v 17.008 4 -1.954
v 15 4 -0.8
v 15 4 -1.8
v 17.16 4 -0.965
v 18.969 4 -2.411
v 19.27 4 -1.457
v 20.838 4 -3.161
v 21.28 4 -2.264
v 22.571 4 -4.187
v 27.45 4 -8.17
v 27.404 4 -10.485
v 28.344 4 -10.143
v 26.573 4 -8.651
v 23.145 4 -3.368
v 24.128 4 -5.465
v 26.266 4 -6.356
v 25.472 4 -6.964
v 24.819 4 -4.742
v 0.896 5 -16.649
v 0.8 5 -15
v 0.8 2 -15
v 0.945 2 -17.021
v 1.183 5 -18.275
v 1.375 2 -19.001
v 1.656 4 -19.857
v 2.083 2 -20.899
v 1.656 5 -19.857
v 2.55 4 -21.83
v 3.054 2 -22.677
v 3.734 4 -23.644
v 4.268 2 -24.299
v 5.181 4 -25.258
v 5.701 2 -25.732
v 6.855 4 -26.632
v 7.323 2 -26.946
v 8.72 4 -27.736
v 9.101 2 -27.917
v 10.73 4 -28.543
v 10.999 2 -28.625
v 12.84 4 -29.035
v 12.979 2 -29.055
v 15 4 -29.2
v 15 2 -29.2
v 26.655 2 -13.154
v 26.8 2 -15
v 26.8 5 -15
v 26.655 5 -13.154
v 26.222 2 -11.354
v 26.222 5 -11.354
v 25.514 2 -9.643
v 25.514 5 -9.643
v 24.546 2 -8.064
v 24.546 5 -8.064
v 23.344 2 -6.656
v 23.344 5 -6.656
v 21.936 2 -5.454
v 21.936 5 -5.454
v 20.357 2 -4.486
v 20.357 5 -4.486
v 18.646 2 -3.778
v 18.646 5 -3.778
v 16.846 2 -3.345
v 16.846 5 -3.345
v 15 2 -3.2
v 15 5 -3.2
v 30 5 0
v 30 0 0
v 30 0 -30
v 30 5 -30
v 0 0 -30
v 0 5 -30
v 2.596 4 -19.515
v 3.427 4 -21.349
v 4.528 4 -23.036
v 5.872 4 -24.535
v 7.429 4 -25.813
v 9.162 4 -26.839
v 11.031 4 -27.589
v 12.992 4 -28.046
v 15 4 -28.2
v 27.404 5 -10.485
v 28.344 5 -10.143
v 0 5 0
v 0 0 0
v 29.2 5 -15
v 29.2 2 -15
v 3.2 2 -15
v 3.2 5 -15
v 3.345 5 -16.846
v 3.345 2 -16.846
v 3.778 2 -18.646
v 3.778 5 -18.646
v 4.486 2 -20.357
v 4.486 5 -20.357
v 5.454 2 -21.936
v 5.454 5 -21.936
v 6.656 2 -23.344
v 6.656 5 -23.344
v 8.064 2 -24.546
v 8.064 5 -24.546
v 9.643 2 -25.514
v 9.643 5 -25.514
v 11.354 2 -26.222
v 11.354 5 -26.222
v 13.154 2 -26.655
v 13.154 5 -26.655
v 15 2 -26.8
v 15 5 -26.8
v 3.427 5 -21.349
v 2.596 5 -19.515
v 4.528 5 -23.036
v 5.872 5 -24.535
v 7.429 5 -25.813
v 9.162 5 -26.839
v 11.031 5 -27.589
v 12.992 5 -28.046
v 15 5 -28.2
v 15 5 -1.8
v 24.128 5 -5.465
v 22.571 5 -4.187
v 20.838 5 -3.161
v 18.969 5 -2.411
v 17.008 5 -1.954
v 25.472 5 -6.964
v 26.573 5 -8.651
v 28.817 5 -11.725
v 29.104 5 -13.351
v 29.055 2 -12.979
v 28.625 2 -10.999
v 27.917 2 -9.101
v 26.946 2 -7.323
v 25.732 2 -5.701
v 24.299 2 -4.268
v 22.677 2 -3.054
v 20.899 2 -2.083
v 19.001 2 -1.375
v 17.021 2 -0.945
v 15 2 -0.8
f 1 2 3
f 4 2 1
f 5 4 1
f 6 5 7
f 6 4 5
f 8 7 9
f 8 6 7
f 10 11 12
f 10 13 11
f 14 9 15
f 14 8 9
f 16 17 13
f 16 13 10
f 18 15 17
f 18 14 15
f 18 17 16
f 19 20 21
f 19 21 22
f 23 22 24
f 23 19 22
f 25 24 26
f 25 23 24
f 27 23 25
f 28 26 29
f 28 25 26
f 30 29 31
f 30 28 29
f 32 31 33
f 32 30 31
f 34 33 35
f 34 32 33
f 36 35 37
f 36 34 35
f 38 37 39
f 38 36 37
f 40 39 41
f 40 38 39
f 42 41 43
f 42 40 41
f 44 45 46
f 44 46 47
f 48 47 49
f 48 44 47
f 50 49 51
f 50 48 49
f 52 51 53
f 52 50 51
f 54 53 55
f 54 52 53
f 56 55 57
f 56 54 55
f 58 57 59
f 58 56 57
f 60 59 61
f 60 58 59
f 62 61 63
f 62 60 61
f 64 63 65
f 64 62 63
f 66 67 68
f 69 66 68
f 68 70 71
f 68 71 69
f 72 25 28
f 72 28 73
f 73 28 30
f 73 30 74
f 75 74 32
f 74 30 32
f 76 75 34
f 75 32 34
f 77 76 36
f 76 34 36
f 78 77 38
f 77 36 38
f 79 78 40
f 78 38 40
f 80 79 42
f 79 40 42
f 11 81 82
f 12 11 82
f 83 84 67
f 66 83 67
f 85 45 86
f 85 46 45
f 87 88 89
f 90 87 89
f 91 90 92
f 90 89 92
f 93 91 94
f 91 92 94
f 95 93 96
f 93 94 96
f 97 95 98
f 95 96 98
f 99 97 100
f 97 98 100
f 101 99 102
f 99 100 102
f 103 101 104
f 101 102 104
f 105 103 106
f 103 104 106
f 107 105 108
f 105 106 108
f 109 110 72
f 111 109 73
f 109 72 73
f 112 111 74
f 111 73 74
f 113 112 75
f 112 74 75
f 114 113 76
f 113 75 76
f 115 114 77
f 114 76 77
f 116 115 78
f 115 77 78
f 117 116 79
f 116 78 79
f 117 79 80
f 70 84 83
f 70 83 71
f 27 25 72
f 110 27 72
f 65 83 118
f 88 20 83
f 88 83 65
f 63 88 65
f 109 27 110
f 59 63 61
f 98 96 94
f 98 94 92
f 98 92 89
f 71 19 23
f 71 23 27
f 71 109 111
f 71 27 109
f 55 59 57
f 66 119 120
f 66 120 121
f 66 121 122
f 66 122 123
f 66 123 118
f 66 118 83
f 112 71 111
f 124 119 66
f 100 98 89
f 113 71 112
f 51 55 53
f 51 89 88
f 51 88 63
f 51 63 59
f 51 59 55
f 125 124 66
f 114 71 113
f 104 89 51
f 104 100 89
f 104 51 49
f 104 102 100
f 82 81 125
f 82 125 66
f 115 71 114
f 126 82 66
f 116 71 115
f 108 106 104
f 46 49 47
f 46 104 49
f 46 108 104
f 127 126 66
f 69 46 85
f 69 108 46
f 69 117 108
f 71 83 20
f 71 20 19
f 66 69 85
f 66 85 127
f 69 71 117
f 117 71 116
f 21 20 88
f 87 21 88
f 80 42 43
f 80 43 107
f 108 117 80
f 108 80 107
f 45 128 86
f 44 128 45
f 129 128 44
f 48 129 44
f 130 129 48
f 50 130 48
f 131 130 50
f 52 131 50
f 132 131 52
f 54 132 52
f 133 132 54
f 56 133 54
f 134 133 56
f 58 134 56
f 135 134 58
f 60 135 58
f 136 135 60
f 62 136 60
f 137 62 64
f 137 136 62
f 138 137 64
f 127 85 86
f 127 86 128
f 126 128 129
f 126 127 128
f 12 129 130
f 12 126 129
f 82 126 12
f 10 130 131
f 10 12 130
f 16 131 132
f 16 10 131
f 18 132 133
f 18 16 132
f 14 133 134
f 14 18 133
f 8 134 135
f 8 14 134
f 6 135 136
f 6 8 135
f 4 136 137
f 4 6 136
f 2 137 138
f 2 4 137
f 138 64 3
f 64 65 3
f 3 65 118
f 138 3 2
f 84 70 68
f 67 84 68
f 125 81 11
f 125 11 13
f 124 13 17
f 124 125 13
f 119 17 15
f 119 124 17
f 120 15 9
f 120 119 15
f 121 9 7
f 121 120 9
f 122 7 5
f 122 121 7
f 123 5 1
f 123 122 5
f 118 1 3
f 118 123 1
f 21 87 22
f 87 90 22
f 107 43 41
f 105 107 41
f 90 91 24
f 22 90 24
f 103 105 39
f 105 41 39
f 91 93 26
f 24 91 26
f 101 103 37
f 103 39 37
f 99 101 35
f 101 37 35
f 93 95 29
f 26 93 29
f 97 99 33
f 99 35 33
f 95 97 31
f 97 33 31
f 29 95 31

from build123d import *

# Parameters (mm, degrees)
SKETCH1_W           = 30
SKETCH1_H           = 30
BOSS_EXTRUDE1_DEPTH = 5
CUT_REVOLVE2_ANGLE  = 90
SKETCH2_5_W         = 2.4
SKETCH2_5_H         = 3
SKETCH2_5_W_2       = 1
SKETCH2_5_H_2       = 1
CUT_REVOLVE3_ANGLE  = 20


with BuildPart() as part:
    # Sketch1 → Boss-Extrude1 (new body)
    with BuildSketch(Plane(origin=(0, 0, 0), x_dir=(1, 0, 0), z_dir=(0, 1, 0))):
        with Locations((15, 15)):
            Rectangle(SKETCH1_W, SKETCH1_H)
    extrude(amount=BOSS_EXTRUDE1_DEPTH)

    # Sketch2 → Cut-Revolve2 (revolve, cut)
    with BuildSketch(Plane.XY.offset(-15)):
        Polygon((1.8, 4), (0.8, 4), (0.8, 2), (3.2, 2), (3.2, 5), (1.8, 5), align=None)
        Polygon((26.8, 2), (29.2, 2), (29.2, 4), (28.2, 4), (28.2, 5), (26.8, 5), align=None)
    revolve(axis=Axis((15, 5, -15), (0, -1, 0)), revolution_arc=CUT_REVOLVE2_ANGLE, mode=Mode.SUBTRACT)

    # Sketch2<5> → Cut-Revolve3 (revolve, cut)
    with BuildSketch(Plane.XY.offset(-15)):
        with Locations((2, 3.5)):
            Rectangle(SKETCH2_5_W, SKETCH2_5_H)
        with Locations((28.7, 4.5)):
            Rectangle(SKETCH2_5_W_2, SKETCH2_5_H_2)
    revolve(axis=Axis((15, 5, -15), (0, -1, 0)), revolution_arc=CUT_REVOLVE3_ANGLE, mode=Mode.SUBTRACT)


solid = part.part
